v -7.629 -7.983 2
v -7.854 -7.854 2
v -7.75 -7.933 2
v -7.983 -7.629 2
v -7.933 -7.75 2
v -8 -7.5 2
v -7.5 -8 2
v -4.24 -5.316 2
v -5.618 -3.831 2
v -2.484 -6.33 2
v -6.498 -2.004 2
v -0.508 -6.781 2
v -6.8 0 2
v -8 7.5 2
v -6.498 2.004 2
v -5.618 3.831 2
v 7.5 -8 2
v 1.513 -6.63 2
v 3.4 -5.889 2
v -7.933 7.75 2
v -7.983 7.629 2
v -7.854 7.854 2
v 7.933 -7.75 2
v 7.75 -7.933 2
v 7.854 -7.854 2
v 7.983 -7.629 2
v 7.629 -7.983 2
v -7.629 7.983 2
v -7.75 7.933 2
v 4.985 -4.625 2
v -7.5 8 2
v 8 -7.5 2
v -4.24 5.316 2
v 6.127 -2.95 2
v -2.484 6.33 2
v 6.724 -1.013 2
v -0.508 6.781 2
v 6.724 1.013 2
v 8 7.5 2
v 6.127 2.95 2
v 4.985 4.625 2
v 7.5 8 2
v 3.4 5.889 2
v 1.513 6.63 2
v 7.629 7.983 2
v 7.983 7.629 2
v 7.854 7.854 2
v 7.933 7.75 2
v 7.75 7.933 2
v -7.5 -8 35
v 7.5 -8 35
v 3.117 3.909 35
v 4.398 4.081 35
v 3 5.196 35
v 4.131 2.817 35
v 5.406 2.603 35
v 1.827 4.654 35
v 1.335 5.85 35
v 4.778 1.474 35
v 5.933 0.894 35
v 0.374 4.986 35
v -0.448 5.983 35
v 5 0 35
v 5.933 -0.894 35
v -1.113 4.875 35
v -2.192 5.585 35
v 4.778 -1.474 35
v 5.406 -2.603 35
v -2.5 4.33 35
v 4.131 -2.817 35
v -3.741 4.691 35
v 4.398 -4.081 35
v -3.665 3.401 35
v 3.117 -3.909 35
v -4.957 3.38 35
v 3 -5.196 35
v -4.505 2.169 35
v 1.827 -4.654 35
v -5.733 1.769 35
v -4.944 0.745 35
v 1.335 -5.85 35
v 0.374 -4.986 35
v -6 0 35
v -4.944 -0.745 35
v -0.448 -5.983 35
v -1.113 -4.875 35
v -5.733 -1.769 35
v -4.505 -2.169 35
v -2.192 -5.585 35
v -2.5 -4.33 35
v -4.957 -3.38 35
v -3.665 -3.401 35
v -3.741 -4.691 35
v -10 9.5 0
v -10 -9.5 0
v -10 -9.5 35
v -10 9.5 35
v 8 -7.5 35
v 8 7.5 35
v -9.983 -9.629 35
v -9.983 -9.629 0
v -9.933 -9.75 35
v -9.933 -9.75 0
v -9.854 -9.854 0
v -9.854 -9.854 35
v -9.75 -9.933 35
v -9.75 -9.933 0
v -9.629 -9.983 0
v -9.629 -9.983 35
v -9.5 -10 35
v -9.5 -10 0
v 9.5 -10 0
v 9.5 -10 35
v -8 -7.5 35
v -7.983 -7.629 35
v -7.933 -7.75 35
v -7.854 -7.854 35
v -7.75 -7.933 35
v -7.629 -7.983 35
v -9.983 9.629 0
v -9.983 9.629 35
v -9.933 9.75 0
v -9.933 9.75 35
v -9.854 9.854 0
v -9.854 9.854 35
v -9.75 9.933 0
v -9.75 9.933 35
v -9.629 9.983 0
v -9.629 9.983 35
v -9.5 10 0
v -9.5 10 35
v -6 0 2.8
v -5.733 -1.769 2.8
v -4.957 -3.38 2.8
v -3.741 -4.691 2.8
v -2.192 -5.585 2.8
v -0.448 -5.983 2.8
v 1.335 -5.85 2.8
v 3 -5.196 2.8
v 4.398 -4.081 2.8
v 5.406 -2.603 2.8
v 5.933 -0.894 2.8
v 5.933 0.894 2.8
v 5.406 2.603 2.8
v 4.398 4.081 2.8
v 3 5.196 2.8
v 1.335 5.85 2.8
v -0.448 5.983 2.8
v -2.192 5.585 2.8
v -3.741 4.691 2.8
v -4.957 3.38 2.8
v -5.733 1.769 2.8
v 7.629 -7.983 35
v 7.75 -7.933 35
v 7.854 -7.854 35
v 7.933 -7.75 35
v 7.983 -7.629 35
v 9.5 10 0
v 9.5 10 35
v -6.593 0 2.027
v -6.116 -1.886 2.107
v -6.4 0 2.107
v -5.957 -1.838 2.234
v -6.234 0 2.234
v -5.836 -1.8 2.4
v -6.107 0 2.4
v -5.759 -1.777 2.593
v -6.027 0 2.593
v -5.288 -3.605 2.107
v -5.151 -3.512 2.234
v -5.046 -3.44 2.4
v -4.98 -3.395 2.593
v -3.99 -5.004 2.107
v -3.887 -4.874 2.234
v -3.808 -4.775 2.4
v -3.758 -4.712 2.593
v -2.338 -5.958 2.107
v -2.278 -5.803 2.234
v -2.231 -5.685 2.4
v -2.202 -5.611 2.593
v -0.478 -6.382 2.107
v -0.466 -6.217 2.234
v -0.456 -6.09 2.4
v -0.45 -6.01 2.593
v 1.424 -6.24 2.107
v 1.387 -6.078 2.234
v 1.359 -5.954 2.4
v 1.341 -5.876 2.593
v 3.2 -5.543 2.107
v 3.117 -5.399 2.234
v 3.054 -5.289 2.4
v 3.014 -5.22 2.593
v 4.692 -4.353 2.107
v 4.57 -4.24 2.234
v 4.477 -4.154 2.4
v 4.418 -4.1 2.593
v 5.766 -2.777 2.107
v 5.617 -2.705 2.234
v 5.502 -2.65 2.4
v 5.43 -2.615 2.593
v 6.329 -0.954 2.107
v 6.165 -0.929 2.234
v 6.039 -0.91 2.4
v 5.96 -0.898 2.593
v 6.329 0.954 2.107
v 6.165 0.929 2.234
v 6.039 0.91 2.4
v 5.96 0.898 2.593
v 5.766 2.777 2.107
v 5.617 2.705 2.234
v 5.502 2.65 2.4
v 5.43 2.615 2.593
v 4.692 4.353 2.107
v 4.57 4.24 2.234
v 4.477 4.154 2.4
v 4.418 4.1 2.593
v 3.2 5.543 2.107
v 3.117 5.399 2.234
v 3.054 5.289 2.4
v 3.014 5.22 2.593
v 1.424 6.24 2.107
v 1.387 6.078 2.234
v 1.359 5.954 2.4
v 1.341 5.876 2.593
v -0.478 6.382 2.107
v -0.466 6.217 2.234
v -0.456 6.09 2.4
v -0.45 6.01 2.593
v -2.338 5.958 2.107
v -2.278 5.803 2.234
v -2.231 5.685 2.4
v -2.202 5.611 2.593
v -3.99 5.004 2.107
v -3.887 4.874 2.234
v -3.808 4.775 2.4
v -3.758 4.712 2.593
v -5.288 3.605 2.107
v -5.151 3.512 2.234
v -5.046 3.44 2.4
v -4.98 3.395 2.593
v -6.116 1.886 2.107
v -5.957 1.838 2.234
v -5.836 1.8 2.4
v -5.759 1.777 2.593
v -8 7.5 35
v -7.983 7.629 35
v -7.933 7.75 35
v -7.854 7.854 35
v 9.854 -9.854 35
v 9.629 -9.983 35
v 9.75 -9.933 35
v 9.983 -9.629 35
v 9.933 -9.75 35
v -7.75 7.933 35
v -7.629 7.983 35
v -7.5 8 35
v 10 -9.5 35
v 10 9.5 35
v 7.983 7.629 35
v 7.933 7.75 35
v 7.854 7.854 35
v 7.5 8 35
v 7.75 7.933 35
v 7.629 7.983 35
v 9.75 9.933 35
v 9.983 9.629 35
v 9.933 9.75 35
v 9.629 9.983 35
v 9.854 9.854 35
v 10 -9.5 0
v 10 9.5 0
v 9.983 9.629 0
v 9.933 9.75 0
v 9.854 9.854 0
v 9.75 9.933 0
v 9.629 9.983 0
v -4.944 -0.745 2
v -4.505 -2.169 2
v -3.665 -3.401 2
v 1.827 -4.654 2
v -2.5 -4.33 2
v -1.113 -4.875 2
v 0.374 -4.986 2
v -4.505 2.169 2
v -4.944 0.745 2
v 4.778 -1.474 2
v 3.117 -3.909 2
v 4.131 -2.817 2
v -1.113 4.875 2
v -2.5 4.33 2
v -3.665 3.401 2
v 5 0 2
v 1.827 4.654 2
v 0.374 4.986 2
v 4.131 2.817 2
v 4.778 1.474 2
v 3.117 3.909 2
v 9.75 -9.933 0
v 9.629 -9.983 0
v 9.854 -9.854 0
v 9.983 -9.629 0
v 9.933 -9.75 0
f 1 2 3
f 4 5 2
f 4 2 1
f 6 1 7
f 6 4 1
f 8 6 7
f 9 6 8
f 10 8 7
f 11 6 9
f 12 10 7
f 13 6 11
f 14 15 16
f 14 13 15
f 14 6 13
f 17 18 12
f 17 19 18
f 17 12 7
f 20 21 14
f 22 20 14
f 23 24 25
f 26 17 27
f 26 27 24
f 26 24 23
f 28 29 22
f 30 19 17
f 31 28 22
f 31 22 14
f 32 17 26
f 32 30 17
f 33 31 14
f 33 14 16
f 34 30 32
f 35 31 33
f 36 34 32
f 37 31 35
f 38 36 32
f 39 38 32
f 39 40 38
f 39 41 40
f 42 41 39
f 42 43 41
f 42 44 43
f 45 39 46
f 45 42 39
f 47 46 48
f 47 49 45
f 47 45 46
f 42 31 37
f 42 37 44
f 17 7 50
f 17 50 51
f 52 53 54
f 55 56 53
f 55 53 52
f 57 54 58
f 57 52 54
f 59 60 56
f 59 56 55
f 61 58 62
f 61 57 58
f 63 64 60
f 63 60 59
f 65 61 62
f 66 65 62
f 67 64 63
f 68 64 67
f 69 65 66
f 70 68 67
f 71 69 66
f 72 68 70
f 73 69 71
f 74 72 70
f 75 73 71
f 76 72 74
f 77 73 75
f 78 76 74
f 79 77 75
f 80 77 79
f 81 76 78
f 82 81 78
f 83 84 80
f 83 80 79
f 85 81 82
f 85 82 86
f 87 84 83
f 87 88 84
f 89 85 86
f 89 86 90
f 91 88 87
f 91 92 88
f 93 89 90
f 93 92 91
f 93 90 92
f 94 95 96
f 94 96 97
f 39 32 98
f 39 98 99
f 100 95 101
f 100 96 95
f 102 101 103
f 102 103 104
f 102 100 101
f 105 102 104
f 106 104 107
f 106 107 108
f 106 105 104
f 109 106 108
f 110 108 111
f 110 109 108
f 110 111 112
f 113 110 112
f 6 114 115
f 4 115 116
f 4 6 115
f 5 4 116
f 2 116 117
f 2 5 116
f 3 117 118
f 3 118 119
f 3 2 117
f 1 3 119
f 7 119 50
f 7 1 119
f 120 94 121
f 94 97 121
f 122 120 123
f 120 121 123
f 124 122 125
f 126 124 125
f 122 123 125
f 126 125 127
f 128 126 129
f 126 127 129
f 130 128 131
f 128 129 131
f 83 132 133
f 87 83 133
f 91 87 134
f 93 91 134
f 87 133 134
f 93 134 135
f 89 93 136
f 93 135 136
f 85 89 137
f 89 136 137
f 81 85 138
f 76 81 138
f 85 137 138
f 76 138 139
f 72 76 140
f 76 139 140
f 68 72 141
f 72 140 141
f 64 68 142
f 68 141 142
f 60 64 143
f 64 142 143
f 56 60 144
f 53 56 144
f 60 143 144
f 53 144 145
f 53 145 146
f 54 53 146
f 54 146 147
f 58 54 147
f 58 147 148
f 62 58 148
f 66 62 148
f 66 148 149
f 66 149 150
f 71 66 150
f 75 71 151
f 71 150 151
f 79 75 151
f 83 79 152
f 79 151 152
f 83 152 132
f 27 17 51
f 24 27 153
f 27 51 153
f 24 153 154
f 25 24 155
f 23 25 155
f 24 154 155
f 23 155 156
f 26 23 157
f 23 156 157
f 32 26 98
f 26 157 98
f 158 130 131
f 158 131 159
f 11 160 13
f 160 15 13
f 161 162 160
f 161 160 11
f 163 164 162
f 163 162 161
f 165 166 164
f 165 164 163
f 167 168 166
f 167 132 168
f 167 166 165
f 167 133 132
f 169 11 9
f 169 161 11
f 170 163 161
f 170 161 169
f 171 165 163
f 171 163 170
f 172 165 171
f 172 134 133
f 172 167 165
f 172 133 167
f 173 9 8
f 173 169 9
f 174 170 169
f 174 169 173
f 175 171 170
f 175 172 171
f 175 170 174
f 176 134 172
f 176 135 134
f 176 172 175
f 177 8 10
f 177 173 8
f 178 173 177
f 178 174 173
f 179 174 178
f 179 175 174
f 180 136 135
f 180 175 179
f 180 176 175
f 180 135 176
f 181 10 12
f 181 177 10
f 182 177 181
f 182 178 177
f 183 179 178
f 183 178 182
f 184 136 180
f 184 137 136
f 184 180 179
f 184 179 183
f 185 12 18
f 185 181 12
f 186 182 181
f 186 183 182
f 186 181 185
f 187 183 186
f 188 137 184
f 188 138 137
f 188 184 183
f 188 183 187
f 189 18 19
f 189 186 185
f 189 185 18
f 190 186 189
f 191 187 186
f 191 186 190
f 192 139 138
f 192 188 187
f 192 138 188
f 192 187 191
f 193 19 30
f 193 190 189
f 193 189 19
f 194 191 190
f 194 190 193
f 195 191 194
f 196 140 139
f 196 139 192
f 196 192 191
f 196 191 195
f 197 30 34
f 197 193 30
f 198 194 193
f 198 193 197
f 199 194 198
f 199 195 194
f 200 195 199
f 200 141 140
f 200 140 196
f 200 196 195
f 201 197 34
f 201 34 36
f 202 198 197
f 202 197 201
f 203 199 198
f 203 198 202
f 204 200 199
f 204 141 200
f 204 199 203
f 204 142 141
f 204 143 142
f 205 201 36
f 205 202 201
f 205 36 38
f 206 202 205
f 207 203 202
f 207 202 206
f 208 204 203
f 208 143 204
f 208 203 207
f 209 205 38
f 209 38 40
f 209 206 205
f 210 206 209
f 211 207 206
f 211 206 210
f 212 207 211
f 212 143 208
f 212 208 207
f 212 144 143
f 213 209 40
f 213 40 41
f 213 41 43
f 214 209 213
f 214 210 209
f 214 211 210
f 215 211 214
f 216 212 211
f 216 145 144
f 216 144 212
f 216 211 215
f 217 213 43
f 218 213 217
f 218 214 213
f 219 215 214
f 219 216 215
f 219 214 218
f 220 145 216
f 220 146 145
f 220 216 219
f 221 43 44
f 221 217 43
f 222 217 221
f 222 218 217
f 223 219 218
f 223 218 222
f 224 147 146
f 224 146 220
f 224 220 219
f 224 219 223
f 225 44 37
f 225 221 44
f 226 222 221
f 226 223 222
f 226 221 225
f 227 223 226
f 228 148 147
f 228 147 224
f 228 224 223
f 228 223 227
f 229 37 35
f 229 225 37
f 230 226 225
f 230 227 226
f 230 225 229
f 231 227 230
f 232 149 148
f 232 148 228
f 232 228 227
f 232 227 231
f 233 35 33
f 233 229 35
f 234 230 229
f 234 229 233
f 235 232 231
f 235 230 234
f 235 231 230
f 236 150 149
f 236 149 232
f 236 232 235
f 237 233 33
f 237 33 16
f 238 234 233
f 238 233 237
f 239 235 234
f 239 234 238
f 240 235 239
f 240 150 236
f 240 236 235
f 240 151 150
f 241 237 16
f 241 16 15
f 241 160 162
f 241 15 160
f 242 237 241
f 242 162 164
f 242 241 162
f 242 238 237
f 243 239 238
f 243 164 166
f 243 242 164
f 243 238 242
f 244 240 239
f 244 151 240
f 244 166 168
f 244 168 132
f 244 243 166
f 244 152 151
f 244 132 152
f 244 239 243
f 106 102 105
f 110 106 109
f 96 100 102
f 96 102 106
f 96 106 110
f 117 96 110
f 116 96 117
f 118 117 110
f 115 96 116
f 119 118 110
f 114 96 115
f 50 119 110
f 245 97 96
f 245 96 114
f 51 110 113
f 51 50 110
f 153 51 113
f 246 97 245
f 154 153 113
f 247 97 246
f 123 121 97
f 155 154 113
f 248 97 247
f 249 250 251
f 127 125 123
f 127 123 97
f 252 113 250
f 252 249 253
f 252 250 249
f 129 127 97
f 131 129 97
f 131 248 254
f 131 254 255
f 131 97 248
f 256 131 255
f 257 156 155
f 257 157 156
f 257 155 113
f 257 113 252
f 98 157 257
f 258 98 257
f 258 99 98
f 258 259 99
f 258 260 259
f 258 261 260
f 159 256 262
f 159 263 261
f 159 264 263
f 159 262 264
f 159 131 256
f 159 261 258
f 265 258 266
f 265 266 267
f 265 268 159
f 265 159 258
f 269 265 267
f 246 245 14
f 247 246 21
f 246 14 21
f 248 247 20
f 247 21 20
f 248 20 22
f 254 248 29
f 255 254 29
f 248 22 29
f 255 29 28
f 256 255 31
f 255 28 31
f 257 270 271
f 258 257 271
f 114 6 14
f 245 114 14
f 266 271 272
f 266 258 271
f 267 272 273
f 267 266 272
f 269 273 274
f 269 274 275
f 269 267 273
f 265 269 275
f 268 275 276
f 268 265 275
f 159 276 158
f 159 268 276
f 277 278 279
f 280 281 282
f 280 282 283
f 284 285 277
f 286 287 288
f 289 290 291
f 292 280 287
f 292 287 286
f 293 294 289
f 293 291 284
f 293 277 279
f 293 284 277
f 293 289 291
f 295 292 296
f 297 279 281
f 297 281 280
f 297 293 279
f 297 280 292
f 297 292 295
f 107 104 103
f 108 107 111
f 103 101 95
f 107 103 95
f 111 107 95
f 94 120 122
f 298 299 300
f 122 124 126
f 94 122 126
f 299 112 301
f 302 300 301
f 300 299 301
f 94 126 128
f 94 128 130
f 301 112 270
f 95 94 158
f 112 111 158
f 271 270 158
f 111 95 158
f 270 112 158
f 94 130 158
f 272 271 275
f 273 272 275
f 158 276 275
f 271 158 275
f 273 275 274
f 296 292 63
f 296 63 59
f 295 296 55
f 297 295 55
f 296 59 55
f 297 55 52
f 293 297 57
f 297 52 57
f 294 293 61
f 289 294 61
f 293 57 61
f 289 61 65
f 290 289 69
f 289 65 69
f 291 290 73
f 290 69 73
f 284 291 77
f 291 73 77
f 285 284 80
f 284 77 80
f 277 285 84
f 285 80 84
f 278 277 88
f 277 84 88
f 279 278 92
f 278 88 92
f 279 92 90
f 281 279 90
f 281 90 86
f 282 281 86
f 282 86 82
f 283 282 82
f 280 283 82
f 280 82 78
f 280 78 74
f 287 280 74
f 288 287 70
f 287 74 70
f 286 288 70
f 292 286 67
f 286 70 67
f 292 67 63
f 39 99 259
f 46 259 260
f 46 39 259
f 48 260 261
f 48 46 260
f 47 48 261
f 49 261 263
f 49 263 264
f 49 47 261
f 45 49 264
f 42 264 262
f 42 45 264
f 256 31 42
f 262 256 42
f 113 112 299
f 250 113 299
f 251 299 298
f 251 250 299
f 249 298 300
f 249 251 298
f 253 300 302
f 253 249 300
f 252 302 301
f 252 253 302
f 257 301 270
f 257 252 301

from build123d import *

# Parameters (mm, degrees)
ESQUISSE1_W             = 20
ESQUISSE1_H             = 20
BOSS_EXTRU_1_DEPTH      = 35
COQUE2_T                = -2
CONG_1_R                = 0.5
ESQUISSE2_R             = 6
BOSS_EXTRU_2_DEPTH      = 33
ESQUISSE3_R             = 5
ENL_V_MAT_EXTRU_3_DEPTH = 33
CONG_2_R                = 0.8


with BuildPart() as part:
    # Esquisse1 → Boss.-Extru.1 (new body)
    with BuildSketch(Plane.XY):
        Rectangle(ESQUISSE1_W, ESQUISSE1_H)
    extrude(amount=BOSS_EXTRU_1_DEPTH)

    # Coque2
    coque2_openings = [part.faces().sort_by_distance(p)[0] for p in [
        (0, 0, 35),
    ]]
    offset(amount=COQUE2_T, openings=coque2_openings, kind=Kind.INTERSECTION)

    # Congé1
    cong_1_edges = [part.edges().sort_by_distance(p)[0] for p in [
        (-8, 8, 18.5),
        (-8, -8, 18.5),
        (8, -8, 18.5),
        (8, 8, 18.5),
        (-10, 10, 17.5),
        (10, 10, 17.5),
        (10, -10, 17.5),
        (-10, -10, 17.5),
    ]]
    fillet(cong_1_edges, radius=CONG_1_R)

    # Esquisse2 → Boss.-Extru.2 (add)
    with BuildSketch(Plane.XY.offset(2)):
        with Locations(Location((0, 0, 0), (0, 0, 180))):
            Circle(ESQUISSE2_R)
    extrude(amount=BOSS_EXTRU_2_DEPTH)

    # Esquisse3 → Enlèv. mat.-Extru.3 (cut)
    with BuildSketch(Plane.XY.offset(35)):
        Circle(ESQUISSE3_R)
    extrude(amount=-ENL_V_MAT_EXTRU_3_DEPTH, mode=Mode.SUBTRACT)

    # Congé2
    cong_2_edges = [part.edges().sort_by_distance(p)[0] for p in [
        (6, 0, 2),
    ]]
    fillet(cong_2_edges, radius=CONG_2_R)


solid = part.part
